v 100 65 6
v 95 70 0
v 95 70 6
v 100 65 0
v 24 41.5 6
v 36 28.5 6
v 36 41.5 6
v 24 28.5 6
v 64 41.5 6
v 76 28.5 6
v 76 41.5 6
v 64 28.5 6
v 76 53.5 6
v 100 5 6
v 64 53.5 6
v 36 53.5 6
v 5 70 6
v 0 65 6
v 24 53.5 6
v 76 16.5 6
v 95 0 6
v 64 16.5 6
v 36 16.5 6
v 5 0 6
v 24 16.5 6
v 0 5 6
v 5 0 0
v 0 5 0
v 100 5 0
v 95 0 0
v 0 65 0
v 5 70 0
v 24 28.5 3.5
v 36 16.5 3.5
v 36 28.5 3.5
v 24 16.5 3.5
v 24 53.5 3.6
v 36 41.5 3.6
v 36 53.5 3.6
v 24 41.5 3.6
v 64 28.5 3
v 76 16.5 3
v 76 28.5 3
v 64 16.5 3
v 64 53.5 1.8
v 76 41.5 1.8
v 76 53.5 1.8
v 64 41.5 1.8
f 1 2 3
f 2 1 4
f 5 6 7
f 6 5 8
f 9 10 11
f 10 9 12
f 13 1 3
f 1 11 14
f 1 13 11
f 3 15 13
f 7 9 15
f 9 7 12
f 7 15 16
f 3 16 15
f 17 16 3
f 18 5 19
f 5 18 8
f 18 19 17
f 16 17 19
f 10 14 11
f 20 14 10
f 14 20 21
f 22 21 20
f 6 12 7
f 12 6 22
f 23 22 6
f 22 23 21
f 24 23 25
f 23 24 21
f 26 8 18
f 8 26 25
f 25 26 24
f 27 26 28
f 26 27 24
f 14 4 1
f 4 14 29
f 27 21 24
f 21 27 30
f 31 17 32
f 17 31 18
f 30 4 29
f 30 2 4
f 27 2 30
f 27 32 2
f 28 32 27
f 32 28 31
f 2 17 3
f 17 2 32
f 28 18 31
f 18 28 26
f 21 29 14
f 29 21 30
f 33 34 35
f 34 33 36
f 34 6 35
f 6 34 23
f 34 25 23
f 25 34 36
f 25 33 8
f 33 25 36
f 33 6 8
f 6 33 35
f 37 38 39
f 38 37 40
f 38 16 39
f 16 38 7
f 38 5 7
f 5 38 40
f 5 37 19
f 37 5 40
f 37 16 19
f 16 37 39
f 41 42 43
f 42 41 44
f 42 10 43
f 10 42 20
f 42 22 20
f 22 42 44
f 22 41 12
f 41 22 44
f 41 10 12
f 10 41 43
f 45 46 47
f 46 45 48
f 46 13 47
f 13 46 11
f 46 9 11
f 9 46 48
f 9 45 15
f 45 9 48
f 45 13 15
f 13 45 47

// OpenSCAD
$fn = 32;

// ----------------------------------------------------------------------
// Windowed plate: 4 voids, 100 x 70 x 6 mm
// ----------------------------------------------------------------------

// --- parameters (mm) ---
plate_l = 100;            // plate length, X
plate_w = 70;             // plate width, Y
plate_t = 6;              // plate thickness, Z
edge_margin = 10;         // wall from the plate edge to any window
win_l = 12;               // pocket length
win_w = 12;               // pocket width
pitch_x = 40;             // grid pitch along X
pitch_y = 25;             // grid pitch along Y
depth_1 = 2.5;            // depth of void 1 (full thickness = through)
depth_2 = 2.4;            // depth of void 2 (full thickness = through)
depth_3 = 3;              // depth of void 3 (full thickness = through)
depth_4 = 4.2;            // depth of void 4 (full thickness = through)
corner_c = 5;             // corner chamfer of the plate

profile = [[5, 0], [95, 0], [100, 5], [100, 65], [95, 70], [5, 70], [0, 65], [0, 5]];  // primary outline, 8 points, counter clockwise
void_1 = [[24, 16.5], [36, 16.5], [36, 28.5], [24, 28.5]];  // pocket at grid node 0,0, 4 points
void_2 = [[24, 41.5], [36, 41.5], [36, 53.5], [24, 53.5]];  // pocket at grid node 0,1, 4 points
void_3 = [[64, 16.5], [76, 16.5], [76, 28.5], [64, 28.5]];  // pocket at grid node 1,0, 4 points
void_4 = [[64, 41.5], [76, 41.5], [76, 53.5], [64, 53.5]];  // pocket at grid node 1,1, 4 points

// --- the one profile operation ---
difference() {
  linear_extrude(height = plate_t) polygon(points = profile);
  translate([0, 0, plate_t - depth_1])
    linear_extrude(height = depth_1 + 1) polygon(points = void_1);
  translate([0, 0, plate_t - depth_2])
    linear_extrude(height = depth_2 + 1) polygon(points = void_2);
  translate([0, 0, plate_t - depth_3])
    linear_extrude(height = depth_3 + 1) polygon(points = void_3);
  translate([0, 0, plate_t - depth_4])
    linear_extrude(height = depth_4 + 1) polygon(points = void_4);
}
